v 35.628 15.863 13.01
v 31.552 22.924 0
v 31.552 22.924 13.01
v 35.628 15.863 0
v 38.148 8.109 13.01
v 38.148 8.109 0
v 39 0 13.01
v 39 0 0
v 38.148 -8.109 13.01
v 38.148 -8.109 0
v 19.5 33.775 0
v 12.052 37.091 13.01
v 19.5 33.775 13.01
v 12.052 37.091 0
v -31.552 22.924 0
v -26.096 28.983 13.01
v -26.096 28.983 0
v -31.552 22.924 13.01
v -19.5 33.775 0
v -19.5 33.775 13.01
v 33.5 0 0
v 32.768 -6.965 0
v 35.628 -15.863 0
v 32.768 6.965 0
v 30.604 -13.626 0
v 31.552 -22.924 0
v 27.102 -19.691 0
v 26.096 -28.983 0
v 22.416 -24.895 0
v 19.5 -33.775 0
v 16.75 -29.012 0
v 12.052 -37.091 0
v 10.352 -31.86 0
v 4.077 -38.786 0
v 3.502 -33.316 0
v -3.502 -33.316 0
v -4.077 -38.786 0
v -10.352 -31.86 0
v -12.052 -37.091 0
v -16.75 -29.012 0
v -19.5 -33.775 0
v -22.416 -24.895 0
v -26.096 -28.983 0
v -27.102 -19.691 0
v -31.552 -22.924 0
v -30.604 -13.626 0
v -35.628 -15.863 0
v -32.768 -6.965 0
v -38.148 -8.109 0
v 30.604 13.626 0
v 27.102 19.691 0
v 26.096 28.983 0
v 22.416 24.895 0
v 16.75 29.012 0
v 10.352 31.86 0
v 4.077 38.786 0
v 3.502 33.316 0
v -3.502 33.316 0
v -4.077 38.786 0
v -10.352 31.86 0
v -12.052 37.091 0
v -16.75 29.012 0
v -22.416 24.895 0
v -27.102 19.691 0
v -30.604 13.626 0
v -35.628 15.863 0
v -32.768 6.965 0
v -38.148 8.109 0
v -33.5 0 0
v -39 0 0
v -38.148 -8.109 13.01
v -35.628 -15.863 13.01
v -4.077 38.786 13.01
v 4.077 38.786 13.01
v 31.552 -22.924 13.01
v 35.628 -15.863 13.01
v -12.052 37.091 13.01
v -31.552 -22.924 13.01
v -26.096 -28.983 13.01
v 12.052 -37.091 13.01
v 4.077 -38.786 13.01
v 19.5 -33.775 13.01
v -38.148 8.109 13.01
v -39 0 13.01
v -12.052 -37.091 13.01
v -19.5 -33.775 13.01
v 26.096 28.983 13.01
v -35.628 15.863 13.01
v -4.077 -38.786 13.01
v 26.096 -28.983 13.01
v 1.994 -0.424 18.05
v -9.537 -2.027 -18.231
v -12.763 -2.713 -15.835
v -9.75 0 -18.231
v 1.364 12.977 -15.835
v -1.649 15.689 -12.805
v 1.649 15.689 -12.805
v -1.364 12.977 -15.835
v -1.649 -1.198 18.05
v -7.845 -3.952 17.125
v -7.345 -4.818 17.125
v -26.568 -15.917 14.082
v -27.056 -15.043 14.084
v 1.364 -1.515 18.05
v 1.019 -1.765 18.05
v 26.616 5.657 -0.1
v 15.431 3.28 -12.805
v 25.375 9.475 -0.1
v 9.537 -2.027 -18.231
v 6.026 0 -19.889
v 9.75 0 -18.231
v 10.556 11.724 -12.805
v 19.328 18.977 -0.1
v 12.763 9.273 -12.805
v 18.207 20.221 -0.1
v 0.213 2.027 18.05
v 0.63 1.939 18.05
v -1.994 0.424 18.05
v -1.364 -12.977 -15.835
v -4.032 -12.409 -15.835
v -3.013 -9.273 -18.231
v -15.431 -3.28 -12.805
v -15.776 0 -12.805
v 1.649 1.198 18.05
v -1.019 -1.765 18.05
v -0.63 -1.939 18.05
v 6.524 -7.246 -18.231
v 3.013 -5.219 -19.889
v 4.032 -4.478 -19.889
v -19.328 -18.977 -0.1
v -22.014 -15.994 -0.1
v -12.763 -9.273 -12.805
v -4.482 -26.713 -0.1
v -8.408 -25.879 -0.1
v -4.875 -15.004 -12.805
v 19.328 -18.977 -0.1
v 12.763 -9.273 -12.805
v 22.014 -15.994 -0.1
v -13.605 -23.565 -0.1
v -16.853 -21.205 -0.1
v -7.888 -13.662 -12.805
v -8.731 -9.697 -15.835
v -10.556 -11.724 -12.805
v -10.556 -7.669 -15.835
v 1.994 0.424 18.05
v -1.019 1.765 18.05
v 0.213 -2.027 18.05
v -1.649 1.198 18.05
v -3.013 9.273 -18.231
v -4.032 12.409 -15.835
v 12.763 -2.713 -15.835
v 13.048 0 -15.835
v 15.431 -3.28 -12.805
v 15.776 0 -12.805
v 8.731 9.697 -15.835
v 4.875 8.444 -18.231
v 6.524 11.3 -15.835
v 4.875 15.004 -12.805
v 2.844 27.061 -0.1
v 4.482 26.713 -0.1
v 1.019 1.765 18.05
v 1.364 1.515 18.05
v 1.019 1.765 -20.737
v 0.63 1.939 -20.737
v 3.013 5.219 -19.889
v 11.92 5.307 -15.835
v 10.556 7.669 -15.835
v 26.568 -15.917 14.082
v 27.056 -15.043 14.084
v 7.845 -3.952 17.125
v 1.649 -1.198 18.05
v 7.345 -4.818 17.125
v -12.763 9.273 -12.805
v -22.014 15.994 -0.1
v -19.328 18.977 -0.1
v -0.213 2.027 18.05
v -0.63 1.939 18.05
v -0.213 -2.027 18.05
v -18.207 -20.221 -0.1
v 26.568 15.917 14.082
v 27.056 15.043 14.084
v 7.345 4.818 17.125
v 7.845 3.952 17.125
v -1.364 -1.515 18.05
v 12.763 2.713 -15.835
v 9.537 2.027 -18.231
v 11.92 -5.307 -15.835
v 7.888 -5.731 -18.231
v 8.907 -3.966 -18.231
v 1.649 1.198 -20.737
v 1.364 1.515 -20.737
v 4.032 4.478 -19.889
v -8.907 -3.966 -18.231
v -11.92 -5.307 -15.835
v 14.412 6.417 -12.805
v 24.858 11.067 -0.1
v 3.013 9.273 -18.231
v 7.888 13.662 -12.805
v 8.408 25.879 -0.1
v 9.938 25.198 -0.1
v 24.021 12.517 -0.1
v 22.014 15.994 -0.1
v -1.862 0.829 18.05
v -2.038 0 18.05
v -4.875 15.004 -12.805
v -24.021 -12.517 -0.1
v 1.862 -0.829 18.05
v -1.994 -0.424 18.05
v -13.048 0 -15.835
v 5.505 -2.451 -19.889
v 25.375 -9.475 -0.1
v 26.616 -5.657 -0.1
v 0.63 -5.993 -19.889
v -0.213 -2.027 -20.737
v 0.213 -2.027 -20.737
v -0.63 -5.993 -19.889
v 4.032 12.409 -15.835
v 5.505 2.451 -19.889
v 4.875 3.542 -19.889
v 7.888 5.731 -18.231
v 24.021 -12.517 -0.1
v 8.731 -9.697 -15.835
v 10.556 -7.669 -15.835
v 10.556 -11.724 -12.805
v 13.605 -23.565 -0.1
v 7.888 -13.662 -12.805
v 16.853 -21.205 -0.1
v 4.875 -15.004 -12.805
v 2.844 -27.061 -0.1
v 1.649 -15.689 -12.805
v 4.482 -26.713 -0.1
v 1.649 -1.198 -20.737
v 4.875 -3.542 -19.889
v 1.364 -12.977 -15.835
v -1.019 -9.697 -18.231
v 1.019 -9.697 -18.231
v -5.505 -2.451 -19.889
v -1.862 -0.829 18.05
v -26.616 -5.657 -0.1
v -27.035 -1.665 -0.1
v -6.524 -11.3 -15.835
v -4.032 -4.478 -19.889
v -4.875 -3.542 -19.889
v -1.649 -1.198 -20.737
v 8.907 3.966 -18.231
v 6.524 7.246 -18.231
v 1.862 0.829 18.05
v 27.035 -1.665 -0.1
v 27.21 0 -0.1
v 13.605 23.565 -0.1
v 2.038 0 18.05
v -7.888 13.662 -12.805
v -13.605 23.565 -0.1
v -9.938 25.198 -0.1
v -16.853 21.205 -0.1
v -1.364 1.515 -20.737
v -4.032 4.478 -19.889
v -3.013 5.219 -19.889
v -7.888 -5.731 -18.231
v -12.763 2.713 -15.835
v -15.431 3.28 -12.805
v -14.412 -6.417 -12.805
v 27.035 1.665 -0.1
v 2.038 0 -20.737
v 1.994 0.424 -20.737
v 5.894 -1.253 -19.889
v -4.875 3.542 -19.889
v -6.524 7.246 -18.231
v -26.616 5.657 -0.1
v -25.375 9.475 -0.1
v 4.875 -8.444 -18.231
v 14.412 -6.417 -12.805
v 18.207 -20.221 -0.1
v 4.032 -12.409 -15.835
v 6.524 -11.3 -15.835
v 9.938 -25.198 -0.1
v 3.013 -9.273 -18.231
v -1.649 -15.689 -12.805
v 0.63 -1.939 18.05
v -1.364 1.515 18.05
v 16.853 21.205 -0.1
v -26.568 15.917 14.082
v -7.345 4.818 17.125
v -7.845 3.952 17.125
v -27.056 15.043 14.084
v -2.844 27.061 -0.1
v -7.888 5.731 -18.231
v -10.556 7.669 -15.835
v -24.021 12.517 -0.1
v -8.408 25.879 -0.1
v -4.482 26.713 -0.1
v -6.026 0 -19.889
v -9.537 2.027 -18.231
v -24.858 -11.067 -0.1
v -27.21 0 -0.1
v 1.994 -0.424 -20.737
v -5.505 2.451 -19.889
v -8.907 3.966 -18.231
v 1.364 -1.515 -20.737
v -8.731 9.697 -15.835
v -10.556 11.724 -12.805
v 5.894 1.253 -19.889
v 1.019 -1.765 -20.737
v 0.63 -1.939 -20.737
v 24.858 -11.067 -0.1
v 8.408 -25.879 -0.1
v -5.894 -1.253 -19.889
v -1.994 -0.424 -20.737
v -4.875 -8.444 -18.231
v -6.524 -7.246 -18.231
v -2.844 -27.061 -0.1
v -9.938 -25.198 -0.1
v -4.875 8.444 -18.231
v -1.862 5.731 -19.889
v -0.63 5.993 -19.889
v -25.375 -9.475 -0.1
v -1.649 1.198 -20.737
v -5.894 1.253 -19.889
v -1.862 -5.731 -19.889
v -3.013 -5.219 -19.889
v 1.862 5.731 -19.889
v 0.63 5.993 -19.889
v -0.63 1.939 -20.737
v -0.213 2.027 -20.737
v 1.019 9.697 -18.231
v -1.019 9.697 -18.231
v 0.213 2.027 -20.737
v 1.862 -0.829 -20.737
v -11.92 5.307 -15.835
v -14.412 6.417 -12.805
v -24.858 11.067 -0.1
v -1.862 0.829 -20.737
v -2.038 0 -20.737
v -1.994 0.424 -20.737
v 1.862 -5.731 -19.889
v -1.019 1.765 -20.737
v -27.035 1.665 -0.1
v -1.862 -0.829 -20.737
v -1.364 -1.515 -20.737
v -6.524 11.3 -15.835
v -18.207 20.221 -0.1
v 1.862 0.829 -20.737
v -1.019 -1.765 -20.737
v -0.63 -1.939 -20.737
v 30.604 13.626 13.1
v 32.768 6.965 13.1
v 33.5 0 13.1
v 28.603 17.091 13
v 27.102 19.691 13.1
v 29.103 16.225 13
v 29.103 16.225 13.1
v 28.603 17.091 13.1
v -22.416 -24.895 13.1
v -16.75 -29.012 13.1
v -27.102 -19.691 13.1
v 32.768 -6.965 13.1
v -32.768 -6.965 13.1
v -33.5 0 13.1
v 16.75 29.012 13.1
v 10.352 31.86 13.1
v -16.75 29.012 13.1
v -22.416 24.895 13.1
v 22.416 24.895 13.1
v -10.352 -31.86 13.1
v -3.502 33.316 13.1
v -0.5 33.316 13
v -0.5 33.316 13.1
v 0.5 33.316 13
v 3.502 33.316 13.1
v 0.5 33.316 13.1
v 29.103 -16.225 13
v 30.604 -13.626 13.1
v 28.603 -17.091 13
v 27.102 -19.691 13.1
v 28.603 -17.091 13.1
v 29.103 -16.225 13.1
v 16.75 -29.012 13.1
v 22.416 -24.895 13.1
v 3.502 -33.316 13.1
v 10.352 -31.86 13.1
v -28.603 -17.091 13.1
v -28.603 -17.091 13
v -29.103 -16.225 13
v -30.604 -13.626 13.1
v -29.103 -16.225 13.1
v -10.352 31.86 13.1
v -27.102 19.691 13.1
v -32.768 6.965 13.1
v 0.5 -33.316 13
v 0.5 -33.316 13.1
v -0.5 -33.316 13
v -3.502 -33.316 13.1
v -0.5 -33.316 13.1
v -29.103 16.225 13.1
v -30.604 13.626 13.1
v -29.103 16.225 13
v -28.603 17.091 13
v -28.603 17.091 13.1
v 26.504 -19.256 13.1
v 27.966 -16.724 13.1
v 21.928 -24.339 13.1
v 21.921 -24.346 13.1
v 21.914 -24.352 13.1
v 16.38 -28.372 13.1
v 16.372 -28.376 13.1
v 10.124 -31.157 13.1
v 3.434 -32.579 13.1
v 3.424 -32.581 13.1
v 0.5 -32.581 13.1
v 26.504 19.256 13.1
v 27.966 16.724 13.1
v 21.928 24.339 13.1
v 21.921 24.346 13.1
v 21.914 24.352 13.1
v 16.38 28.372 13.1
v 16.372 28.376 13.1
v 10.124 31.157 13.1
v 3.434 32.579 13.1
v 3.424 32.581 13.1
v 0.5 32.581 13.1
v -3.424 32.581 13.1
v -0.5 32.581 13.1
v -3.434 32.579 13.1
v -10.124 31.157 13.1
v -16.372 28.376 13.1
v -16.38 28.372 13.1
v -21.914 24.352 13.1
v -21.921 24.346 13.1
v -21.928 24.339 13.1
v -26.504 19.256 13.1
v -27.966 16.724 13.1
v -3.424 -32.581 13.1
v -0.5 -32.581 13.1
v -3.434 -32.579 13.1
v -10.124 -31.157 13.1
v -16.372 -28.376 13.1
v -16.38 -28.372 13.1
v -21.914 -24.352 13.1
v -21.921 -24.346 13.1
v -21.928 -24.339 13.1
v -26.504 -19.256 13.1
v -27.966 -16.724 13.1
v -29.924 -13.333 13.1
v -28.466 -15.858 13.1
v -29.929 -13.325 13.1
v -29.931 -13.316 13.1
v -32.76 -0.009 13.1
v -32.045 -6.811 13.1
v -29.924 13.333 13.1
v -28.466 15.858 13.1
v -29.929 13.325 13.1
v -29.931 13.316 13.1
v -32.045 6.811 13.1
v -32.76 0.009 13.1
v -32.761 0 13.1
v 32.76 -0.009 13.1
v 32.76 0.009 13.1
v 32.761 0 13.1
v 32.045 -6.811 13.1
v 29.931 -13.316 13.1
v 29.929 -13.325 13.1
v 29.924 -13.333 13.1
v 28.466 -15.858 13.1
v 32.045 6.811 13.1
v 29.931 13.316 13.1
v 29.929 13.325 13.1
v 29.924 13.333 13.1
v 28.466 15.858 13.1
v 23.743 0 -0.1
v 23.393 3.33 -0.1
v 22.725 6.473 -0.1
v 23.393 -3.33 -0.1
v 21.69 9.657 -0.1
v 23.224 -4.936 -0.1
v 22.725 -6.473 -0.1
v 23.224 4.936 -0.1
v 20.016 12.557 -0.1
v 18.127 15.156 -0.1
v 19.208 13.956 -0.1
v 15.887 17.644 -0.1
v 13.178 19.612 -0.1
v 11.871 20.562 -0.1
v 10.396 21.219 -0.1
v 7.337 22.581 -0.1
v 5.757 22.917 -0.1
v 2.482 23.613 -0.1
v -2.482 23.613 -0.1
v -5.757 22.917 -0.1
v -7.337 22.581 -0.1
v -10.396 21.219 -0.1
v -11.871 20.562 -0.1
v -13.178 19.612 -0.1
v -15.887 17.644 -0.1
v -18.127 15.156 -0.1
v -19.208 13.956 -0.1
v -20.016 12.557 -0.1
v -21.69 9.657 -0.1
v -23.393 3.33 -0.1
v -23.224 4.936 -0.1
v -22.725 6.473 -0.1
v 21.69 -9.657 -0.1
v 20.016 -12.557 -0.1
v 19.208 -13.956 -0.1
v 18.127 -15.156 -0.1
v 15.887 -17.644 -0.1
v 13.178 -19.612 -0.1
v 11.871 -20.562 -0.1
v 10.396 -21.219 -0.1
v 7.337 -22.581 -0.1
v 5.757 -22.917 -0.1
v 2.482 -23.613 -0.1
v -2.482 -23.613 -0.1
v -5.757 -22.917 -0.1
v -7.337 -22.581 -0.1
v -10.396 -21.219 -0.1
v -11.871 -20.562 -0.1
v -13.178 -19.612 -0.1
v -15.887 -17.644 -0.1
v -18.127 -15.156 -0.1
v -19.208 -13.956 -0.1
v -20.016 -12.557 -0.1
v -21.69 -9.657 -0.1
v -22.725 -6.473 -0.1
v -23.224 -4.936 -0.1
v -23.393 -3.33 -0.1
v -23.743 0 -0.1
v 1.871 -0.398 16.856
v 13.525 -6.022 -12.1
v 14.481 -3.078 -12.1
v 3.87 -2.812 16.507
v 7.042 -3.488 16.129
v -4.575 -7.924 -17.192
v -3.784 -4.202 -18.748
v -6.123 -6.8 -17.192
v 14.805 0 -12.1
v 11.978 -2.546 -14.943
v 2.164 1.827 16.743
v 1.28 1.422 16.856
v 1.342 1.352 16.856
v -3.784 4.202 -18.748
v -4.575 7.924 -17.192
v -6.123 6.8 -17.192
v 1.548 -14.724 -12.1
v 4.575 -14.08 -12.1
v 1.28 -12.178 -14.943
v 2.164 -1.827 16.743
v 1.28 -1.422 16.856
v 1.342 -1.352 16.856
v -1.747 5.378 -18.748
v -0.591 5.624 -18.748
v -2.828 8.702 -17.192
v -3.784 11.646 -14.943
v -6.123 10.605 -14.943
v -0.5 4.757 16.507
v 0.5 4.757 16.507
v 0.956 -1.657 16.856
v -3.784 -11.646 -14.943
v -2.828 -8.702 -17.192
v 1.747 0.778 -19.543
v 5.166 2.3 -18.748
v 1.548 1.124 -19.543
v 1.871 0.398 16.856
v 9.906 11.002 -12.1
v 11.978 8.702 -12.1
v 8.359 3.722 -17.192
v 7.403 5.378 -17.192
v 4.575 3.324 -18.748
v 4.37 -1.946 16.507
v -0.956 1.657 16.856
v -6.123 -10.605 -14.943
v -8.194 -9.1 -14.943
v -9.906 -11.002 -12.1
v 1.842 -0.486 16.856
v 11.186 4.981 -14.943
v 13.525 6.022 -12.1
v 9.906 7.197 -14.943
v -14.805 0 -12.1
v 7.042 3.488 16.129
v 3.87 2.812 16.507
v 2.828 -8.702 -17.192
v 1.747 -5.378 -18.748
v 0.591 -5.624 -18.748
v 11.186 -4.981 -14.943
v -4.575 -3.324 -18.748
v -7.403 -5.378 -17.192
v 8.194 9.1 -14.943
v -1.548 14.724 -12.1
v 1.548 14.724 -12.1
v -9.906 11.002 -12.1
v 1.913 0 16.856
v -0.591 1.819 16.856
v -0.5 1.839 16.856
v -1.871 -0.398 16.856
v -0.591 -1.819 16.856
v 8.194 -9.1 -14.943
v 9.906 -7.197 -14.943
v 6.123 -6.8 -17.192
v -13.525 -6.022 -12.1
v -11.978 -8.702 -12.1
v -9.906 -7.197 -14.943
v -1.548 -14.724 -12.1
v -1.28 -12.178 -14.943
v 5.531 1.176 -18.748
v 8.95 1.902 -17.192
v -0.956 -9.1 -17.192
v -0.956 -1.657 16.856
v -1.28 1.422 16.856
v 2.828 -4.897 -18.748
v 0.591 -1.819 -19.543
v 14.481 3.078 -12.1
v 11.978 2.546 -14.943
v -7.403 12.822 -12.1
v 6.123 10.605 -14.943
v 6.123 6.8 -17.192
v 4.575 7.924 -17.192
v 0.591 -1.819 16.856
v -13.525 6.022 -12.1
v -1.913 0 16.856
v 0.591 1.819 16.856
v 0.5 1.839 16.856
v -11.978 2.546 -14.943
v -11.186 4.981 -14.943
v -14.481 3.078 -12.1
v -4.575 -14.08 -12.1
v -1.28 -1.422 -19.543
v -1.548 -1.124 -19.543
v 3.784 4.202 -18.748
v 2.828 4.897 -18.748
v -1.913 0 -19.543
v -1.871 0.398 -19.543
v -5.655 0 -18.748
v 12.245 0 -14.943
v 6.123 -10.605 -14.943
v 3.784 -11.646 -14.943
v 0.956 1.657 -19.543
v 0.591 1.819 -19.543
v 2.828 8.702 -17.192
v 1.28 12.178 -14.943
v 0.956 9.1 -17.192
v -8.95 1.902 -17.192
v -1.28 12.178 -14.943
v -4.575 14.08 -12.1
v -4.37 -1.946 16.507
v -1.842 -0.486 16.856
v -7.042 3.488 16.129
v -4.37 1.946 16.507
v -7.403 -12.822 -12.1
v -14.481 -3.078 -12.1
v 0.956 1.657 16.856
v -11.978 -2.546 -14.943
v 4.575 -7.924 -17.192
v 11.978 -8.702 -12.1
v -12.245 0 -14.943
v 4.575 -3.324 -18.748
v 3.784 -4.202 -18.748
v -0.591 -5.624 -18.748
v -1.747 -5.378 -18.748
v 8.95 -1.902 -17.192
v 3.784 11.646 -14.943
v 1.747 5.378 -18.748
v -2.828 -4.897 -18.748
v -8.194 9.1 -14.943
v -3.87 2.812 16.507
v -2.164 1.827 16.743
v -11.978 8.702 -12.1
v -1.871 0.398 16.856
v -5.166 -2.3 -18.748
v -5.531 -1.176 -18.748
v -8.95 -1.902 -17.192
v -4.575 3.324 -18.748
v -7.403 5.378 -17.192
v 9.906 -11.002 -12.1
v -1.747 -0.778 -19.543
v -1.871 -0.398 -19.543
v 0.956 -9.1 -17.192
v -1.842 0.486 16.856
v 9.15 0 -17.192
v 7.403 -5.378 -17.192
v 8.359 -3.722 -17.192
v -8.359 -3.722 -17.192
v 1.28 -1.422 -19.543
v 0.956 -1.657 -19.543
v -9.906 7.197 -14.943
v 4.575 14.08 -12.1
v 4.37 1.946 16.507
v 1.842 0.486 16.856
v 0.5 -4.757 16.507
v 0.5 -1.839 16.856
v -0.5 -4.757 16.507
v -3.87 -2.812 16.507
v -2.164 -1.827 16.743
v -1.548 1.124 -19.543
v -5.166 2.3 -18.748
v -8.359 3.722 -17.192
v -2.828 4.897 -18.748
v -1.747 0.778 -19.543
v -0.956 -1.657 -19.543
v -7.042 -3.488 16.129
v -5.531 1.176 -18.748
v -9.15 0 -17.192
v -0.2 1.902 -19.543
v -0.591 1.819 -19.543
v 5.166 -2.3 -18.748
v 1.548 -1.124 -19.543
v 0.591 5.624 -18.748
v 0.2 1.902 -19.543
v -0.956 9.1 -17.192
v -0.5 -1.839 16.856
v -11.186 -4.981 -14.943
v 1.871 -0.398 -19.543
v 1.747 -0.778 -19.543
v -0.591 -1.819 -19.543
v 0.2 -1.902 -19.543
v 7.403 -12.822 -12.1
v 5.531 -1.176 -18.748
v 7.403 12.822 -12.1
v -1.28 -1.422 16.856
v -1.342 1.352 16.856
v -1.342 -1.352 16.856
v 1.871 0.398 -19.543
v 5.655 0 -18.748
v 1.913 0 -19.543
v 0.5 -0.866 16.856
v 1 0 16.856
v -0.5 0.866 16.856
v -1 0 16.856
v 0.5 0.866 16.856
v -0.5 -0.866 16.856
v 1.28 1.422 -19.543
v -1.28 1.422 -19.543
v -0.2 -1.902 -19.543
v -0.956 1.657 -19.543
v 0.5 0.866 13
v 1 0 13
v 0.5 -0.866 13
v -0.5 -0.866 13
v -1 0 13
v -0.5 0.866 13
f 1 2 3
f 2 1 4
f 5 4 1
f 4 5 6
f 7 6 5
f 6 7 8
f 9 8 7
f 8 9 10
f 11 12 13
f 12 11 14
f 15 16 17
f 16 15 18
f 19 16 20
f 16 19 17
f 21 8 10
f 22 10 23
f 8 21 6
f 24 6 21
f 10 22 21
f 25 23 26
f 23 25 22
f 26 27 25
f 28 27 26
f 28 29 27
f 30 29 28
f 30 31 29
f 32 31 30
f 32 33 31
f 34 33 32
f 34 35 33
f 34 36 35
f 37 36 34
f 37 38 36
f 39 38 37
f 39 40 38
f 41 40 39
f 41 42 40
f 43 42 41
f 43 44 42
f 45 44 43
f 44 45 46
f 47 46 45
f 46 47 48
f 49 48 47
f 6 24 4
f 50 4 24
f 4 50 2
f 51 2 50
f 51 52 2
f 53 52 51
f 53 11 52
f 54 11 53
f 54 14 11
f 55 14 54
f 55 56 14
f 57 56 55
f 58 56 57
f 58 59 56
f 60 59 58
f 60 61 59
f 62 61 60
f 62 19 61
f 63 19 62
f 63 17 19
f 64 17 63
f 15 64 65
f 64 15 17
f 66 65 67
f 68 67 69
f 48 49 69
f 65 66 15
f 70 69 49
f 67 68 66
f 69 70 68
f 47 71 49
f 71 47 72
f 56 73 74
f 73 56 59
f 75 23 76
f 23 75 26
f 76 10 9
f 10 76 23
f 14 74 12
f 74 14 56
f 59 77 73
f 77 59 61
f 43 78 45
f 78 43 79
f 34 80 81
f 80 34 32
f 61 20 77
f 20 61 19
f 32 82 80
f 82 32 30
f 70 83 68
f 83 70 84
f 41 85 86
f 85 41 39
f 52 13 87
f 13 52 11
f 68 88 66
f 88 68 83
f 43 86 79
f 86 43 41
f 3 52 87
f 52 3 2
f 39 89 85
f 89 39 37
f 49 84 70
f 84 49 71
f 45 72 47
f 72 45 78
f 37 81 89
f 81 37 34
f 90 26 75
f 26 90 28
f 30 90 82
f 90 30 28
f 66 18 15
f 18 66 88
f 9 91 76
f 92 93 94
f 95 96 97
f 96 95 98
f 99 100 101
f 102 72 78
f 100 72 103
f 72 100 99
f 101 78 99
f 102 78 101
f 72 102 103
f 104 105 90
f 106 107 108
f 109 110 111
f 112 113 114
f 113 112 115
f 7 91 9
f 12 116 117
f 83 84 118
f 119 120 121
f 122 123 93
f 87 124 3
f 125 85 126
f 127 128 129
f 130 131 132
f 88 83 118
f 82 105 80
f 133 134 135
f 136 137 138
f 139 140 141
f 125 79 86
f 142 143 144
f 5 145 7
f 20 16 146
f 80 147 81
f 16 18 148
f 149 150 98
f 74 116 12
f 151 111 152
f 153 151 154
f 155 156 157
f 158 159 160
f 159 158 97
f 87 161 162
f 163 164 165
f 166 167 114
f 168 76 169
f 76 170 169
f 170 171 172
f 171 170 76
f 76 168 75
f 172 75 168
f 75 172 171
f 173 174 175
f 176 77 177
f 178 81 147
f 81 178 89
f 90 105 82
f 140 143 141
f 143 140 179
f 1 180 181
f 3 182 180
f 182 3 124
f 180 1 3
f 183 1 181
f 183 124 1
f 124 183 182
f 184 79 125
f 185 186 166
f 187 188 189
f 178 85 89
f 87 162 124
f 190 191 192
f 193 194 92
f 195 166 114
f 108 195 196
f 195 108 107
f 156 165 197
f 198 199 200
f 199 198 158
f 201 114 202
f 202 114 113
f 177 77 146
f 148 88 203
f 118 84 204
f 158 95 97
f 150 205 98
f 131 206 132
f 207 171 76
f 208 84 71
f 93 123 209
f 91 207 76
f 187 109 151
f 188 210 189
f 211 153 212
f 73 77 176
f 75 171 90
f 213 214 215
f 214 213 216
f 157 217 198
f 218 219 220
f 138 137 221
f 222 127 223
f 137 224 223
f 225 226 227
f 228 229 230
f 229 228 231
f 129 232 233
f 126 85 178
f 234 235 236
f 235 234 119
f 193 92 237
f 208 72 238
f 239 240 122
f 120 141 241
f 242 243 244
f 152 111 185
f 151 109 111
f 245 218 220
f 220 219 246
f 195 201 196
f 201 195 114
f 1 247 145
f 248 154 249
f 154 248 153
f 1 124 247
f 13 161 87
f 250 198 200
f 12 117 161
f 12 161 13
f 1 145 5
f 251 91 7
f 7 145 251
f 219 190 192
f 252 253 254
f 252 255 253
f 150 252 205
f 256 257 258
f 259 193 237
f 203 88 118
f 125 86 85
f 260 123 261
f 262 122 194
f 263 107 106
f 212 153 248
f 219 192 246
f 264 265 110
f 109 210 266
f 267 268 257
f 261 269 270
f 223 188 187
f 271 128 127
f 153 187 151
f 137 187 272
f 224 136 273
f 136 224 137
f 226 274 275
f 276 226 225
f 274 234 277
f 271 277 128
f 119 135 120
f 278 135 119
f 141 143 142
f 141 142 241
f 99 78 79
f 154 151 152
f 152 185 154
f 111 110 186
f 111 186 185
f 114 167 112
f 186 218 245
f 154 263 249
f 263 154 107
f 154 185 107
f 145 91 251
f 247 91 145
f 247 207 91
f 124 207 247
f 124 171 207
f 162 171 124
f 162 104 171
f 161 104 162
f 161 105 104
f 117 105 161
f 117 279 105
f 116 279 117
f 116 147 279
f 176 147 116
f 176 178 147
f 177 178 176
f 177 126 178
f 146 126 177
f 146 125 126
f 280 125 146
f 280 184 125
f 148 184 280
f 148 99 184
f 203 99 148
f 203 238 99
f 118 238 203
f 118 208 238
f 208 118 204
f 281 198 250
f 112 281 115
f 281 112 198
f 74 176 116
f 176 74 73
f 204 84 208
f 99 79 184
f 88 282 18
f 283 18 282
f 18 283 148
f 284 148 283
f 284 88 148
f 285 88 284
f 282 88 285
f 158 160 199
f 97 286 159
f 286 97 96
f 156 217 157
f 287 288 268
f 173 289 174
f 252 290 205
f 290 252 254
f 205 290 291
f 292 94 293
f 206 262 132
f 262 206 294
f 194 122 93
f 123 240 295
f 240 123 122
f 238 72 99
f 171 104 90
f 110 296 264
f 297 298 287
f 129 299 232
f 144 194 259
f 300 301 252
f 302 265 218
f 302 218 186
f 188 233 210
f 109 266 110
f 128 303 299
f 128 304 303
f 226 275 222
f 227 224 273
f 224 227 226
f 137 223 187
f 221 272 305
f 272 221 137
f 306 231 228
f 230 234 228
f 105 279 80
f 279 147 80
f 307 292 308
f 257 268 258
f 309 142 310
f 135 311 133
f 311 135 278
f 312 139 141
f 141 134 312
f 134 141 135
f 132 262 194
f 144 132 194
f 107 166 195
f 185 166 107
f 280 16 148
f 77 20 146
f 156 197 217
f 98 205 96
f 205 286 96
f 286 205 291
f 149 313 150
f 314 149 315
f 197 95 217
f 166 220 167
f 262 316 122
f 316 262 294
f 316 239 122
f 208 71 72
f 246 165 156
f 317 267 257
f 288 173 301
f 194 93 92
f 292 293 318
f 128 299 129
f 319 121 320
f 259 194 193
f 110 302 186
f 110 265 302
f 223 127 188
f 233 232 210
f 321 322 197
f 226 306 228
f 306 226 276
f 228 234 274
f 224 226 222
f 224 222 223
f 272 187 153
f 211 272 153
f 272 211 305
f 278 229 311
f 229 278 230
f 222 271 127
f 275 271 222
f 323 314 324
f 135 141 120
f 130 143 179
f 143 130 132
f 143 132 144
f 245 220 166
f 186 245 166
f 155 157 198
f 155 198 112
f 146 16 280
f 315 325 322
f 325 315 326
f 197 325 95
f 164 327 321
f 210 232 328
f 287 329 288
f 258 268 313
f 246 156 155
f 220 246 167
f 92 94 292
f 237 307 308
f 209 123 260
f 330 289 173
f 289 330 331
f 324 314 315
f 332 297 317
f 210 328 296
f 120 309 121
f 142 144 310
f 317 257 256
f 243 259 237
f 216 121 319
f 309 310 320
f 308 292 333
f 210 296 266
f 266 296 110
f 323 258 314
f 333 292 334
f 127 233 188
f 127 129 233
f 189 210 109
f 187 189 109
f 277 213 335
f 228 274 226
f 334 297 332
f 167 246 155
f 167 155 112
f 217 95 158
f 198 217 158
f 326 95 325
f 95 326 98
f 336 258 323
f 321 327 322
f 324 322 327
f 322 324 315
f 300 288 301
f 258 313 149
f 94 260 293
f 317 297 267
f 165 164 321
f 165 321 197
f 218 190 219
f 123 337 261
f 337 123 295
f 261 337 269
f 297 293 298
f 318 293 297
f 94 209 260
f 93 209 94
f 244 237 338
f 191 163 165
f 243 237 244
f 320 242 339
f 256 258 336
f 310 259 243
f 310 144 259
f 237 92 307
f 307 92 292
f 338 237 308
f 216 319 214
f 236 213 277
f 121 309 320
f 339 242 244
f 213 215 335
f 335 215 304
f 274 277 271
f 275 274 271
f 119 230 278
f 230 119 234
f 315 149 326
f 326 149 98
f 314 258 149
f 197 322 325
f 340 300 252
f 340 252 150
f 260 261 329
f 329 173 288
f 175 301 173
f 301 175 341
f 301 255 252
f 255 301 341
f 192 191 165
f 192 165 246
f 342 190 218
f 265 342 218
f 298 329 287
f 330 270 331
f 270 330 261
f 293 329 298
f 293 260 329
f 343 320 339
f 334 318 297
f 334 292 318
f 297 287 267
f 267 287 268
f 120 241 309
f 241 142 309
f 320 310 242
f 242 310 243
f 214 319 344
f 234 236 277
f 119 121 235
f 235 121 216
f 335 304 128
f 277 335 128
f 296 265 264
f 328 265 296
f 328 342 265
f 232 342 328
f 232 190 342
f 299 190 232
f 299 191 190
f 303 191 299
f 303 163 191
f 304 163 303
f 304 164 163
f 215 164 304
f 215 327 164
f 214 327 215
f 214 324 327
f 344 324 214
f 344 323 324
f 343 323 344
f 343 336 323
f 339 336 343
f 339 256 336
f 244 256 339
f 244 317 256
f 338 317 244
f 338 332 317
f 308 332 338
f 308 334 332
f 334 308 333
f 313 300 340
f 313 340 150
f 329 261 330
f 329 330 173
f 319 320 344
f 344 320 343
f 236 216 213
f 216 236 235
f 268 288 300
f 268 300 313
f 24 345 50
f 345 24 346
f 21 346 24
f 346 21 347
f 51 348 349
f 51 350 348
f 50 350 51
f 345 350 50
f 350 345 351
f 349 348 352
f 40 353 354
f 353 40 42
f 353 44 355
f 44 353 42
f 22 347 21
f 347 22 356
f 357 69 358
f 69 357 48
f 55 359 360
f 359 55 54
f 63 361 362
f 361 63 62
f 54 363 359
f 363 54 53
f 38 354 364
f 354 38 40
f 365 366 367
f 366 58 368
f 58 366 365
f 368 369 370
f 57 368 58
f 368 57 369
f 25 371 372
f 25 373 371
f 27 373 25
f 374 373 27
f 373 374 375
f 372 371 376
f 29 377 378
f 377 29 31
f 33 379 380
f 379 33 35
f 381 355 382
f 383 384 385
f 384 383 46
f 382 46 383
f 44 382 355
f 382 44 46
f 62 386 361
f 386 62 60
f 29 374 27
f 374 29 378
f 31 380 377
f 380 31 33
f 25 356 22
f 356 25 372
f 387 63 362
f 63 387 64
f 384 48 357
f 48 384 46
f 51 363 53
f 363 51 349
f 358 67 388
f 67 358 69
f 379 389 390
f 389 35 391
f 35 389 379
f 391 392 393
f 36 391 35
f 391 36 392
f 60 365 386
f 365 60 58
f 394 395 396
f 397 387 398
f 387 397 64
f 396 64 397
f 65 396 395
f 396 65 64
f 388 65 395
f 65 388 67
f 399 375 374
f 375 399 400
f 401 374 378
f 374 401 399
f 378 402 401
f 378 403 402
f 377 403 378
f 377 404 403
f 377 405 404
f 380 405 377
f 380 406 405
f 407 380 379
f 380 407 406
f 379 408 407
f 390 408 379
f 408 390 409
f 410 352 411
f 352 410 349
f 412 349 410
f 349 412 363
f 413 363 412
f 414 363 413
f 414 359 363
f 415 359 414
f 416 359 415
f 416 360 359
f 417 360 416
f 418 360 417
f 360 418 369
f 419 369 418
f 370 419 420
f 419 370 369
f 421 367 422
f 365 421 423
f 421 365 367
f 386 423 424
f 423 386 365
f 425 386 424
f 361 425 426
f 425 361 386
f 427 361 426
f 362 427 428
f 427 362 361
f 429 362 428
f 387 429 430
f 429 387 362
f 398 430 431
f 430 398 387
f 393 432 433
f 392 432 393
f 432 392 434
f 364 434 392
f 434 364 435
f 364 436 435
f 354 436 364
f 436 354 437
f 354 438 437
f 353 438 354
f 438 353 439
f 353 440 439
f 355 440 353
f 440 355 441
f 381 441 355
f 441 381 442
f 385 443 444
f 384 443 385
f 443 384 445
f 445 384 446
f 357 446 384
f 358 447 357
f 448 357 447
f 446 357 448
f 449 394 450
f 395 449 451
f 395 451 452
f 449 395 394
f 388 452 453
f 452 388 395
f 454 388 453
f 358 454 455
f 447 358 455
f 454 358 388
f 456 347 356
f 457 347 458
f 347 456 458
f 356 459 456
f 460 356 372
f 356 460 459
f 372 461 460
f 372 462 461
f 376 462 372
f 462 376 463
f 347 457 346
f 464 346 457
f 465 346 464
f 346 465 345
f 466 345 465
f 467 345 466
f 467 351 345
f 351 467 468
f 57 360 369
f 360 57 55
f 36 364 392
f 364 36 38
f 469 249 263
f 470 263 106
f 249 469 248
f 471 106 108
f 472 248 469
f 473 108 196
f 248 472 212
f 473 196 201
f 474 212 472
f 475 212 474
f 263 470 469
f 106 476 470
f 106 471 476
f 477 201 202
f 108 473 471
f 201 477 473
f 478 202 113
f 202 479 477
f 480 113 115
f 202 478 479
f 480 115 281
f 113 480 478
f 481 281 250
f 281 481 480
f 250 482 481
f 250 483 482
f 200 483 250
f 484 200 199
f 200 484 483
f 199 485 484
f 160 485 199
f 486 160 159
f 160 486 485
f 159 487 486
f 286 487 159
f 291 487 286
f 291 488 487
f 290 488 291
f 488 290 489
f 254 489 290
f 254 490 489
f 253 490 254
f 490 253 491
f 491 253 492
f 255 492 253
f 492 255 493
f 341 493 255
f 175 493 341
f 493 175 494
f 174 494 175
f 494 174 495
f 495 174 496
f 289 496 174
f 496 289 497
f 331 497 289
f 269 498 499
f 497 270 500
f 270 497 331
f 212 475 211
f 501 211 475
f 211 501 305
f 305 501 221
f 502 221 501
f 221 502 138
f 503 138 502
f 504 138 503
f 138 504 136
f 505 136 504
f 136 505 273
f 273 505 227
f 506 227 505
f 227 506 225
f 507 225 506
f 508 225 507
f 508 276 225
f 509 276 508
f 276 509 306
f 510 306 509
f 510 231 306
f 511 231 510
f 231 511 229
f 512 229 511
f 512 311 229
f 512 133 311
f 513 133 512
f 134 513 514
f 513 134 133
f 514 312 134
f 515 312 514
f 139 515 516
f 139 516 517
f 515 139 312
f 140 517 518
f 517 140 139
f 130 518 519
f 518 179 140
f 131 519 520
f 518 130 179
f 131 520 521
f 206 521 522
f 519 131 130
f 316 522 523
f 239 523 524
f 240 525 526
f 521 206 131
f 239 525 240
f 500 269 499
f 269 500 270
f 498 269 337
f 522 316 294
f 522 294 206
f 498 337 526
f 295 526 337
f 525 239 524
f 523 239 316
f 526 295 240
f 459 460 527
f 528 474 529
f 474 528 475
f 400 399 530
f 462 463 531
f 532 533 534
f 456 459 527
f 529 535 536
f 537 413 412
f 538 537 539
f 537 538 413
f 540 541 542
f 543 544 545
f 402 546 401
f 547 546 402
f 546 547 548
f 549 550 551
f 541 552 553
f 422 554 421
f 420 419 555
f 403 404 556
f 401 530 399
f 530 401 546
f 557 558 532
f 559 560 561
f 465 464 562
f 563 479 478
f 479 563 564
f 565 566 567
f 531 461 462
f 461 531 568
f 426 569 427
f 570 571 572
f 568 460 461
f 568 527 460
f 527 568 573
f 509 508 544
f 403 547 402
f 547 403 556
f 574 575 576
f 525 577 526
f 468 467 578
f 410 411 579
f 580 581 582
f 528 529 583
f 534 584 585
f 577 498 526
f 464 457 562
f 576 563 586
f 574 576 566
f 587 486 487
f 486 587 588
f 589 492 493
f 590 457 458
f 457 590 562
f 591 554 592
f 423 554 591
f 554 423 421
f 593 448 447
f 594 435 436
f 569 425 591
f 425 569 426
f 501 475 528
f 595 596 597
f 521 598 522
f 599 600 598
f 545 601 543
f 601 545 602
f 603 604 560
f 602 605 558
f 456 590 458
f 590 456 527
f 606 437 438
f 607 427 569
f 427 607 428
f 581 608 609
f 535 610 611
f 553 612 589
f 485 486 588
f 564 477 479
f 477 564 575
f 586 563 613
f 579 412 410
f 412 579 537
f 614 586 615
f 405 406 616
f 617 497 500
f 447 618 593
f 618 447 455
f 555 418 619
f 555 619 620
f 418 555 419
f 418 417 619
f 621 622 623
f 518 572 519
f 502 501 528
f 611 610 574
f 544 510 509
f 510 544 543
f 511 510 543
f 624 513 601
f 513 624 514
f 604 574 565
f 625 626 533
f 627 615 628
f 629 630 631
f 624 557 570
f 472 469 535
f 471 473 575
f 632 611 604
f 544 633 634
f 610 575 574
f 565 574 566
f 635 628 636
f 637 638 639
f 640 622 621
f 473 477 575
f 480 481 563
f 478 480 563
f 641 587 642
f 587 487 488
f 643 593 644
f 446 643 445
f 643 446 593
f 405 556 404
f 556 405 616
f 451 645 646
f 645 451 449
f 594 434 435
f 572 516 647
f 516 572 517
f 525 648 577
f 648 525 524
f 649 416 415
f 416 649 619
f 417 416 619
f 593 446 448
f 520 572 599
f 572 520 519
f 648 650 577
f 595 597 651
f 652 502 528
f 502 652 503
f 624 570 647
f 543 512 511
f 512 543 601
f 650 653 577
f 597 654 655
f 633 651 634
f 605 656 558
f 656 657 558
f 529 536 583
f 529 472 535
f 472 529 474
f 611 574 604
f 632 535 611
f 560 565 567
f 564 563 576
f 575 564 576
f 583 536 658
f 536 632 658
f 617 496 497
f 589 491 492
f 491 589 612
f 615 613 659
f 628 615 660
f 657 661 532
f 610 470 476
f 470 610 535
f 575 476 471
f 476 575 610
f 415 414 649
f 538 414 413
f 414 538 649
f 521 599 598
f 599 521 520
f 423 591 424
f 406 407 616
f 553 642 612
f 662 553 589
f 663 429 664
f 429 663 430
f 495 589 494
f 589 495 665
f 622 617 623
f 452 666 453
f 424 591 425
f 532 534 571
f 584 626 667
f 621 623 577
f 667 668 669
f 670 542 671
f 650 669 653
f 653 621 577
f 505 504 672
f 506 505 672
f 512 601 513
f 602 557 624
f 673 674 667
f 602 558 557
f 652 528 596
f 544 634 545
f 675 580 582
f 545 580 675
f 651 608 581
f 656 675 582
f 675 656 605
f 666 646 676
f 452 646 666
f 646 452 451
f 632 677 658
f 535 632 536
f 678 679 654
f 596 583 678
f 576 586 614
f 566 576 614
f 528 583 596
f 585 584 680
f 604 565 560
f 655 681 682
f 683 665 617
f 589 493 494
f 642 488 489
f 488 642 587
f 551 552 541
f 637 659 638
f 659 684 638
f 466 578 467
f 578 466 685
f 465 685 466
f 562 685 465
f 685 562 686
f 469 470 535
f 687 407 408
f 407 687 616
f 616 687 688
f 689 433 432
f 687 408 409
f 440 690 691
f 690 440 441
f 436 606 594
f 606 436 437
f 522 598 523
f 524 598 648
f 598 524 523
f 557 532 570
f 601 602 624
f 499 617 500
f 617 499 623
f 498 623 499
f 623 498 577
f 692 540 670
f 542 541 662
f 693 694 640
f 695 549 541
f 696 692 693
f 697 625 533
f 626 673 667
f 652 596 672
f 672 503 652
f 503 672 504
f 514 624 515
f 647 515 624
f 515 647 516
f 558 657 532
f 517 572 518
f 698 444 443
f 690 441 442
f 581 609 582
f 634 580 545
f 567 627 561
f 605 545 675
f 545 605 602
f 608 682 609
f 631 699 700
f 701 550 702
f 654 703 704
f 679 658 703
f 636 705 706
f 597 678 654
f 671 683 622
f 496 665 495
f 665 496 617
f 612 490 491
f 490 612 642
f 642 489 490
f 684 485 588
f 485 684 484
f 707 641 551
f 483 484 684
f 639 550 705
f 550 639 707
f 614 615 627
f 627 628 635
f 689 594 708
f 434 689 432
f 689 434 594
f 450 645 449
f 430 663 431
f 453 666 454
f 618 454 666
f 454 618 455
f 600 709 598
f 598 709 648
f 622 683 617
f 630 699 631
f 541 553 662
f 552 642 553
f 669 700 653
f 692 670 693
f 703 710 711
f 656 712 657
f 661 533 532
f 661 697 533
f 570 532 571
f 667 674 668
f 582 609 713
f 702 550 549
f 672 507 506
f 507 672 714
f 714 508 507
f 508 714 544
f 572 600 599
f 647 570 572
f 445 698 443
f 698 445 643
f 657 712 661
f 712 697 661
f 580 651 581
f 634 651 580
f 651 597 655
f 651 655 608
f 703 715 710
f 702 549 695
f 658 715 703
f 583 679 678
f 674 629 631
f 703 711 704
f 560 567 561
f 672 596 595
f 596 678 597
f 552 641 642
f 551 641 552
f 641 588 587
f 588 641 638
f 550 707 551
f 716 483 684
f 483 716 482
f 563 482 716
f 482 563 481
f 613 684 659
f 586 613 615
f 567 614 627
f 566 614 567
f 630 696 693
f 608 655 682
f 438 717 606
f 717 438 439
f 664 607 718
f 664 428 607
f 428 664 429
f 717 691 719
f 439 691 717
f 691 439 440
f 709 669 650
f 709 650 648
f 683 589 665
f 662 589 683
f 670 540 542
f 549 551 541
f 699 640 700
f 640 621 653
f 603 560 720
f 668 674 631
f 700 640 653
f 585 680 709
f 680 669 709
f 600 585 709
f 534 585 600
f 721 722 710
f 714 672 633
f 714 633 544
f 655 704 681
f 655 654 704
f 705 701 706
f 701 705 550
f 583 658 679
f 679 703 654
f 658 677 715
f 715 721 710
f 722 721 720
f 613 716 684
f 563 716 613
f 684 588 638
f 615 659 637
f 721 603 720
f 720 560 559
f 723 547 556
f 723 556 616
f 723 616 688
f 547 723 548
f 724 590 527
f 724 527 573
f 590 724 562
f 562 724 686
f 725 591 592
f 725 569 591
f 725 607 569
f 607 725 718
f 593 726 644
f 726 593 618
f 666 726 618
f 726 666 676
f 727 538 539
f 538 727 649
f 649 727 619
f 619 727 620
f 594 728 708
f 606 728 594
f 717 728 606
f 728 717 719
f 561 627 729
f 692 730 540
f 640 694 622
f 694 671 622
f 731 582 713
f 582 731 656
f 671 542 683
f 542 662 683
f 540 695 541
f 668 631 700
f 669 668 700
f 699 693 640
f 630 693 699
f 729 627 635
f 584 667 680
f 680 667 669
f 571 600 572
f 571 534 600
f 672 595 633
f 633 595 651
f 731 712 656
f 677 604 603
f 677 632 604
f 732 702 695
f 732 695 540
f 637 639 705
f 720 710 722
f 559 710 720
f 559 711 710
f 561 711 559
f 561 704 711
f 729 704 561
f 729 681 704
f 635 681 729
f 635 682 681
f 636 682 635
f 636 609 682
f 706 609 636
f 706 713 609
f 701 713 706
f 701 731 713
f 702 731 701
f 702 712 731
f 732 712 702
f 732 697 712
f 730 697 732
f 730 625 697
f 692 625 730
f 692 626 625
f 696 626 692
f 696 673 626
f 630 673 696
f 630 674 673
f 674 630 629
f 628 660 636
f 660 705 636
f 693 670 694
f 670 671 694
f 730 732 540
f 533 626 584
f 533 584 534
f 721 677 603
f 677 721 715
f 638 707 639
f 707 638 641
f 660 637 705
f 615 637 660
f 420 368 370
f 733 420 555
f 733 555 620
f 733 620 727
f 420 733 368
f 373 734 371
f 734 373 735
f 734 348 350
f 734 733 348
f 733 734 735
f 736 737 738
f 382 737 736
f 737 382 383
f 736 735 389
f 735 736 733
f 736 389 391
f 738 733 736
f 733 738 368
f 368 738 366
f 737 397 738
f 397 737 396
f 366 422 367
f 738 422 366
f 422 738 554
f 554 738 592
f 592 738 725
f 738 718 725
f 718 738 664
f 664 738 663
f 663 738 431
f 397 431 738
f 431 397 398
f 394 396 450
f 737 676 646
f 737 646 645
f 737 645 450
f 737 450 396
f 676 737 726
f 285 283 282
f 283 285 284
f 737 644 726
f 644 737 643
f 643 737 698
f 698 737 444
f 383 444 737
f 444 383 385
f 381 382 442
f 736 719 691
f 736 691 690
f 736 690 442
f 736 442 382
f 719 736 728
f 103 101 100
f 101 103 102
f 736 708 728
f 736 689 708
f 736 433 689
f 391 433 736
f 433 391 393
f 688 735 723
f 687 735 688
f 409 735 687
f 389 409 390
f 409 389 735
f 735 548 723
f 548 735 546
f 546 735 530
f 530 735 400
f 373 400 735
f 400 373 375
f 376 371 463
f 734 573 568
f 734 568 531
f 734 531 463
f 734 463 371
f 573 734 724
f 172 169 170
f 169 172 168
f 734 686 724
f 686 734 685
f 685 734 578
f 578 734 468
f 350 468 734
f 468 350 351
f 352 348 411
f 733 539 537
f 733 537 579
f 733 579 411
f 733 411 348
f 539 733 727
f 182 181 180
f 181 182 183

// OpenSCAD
// Drone Nose Cone - Parametric Design
// Based on specifications from April 17, 2025

/* Parameters */
// Base dimensions
inner_diameter = 67.0;  // mm
outer_diameter = 78.0;  // mm
base_ring_depth = 13.0; // mm
cone_angle = 52.0;      // degrees

// Calculated parameters
inner_radius = inner_diameter / 2;
outer_radius = outer_diameter / 2;
wall_thickness = outer_radius - inner_radius;

// Derived dimensions
// Calculate cone height based on angle and radius difference
cone_height = (outer_radius - inner_radius) / tan(cone_angle);
// Add some height for the rounded tip
total_cone_height = cone_height * 1.2;  

// Nose rounding parameters
tip_rounding_radius = outer_radius * 0.5;

// Lightweighting parameters
use_lightweighting = true;;;;;;;
shell_thickness = 1.2;  // mm - wall thickness for hollow parts
internal_ribs = true;;;;;;;
rib_thickness = 1.0;    // mm
rib_count = 6;          // number of radial ribs

/* Main Module */
module nose_cone() {
    difference() {
        union() {
            // Base ring
            cylinder(h=base_ring_depth, r=outer_radius);
            
            // Cone body
            translate([0, 0, base_ring_depth]) {
                hull() {
                    cylinder(h=0.01, r=outer_radius);
                    translate([0, 0, total_cone_height - tip_rounding_radius]) {
                        sphere(r=tip_rounding_radius);
                    }
                }
            }
        }
        
        // Hollow out the inside
        if (use_lightweighting) {
            // Base hollow - full inner diameter
            translate([0, 0, -0.1])
                cylinder(h=base_ring_depth + 0.2, r=inner_radius);
            
            // Cone hollow - with shell thickness
            translate([0, 0, base_ring_depth]) {
                hull() {
                    cylinder(h=0.01, r=inner_radius);
                    translate([0, 0, total_cone_height - tip_rounding_radius]) {
                        sphere(r=tip_rounding_radius - shell_thickness);
                    }
                }
            }
            
            // Additional lightweighting (optional)
            if (!internal_ribs) {
                // More aggressive hollowing if not using ribs
                translate([0, 0, base_ring_depth + total_cone_height * 0.3]) {
                    scale([0.9, 0.9, 1.2]) sphere(r=inner_radius * 0.8);
                }
            }
        }
    }
    
    // Add internal support ribs if enabled
    if (use_lightweighting && internal_ribs) {
        for (i = [0:rib_count-1]) {
            rotate([0, 0, i * (360 / rib_count)])
            translate([0, 0, base_ring_depth])
            intersection() {
                union() {
                    // Vertical rib
                    translate([-rib_thickness/2, 0, 0])
                        cube([rib_thickness, outer_radius, total_cone_height * 0.8]);
                    // Base reinforcement - triangular
                    translate([-rib_thickness/2, 0, 0])
                        rotate([90, 0, 90])
                        linear_extrude(height=rib_thickness)
                        polygon(points=[[0,0], [total_cone_height*0.3, 0], [0, total_cone_height*0.3]]);
                }
                // Contain ribs within cone
                hull() {
                    cylinder(h=0.01, r=outer_radius);
                    translate([0, 0, total_cone_height - tip_rounding_radius]) {
                        sphere(r=tip_rounding_radius);
                    }
                }
            }
        }
    }
}

/* Render the nose cone */
nose_cone();

/* 
// Uncomment to visualize a cross-section 
difference() {
    nose_cone();
    translate([-100, 0, -10])
        cube([200, 200, 200]);
}
*/
